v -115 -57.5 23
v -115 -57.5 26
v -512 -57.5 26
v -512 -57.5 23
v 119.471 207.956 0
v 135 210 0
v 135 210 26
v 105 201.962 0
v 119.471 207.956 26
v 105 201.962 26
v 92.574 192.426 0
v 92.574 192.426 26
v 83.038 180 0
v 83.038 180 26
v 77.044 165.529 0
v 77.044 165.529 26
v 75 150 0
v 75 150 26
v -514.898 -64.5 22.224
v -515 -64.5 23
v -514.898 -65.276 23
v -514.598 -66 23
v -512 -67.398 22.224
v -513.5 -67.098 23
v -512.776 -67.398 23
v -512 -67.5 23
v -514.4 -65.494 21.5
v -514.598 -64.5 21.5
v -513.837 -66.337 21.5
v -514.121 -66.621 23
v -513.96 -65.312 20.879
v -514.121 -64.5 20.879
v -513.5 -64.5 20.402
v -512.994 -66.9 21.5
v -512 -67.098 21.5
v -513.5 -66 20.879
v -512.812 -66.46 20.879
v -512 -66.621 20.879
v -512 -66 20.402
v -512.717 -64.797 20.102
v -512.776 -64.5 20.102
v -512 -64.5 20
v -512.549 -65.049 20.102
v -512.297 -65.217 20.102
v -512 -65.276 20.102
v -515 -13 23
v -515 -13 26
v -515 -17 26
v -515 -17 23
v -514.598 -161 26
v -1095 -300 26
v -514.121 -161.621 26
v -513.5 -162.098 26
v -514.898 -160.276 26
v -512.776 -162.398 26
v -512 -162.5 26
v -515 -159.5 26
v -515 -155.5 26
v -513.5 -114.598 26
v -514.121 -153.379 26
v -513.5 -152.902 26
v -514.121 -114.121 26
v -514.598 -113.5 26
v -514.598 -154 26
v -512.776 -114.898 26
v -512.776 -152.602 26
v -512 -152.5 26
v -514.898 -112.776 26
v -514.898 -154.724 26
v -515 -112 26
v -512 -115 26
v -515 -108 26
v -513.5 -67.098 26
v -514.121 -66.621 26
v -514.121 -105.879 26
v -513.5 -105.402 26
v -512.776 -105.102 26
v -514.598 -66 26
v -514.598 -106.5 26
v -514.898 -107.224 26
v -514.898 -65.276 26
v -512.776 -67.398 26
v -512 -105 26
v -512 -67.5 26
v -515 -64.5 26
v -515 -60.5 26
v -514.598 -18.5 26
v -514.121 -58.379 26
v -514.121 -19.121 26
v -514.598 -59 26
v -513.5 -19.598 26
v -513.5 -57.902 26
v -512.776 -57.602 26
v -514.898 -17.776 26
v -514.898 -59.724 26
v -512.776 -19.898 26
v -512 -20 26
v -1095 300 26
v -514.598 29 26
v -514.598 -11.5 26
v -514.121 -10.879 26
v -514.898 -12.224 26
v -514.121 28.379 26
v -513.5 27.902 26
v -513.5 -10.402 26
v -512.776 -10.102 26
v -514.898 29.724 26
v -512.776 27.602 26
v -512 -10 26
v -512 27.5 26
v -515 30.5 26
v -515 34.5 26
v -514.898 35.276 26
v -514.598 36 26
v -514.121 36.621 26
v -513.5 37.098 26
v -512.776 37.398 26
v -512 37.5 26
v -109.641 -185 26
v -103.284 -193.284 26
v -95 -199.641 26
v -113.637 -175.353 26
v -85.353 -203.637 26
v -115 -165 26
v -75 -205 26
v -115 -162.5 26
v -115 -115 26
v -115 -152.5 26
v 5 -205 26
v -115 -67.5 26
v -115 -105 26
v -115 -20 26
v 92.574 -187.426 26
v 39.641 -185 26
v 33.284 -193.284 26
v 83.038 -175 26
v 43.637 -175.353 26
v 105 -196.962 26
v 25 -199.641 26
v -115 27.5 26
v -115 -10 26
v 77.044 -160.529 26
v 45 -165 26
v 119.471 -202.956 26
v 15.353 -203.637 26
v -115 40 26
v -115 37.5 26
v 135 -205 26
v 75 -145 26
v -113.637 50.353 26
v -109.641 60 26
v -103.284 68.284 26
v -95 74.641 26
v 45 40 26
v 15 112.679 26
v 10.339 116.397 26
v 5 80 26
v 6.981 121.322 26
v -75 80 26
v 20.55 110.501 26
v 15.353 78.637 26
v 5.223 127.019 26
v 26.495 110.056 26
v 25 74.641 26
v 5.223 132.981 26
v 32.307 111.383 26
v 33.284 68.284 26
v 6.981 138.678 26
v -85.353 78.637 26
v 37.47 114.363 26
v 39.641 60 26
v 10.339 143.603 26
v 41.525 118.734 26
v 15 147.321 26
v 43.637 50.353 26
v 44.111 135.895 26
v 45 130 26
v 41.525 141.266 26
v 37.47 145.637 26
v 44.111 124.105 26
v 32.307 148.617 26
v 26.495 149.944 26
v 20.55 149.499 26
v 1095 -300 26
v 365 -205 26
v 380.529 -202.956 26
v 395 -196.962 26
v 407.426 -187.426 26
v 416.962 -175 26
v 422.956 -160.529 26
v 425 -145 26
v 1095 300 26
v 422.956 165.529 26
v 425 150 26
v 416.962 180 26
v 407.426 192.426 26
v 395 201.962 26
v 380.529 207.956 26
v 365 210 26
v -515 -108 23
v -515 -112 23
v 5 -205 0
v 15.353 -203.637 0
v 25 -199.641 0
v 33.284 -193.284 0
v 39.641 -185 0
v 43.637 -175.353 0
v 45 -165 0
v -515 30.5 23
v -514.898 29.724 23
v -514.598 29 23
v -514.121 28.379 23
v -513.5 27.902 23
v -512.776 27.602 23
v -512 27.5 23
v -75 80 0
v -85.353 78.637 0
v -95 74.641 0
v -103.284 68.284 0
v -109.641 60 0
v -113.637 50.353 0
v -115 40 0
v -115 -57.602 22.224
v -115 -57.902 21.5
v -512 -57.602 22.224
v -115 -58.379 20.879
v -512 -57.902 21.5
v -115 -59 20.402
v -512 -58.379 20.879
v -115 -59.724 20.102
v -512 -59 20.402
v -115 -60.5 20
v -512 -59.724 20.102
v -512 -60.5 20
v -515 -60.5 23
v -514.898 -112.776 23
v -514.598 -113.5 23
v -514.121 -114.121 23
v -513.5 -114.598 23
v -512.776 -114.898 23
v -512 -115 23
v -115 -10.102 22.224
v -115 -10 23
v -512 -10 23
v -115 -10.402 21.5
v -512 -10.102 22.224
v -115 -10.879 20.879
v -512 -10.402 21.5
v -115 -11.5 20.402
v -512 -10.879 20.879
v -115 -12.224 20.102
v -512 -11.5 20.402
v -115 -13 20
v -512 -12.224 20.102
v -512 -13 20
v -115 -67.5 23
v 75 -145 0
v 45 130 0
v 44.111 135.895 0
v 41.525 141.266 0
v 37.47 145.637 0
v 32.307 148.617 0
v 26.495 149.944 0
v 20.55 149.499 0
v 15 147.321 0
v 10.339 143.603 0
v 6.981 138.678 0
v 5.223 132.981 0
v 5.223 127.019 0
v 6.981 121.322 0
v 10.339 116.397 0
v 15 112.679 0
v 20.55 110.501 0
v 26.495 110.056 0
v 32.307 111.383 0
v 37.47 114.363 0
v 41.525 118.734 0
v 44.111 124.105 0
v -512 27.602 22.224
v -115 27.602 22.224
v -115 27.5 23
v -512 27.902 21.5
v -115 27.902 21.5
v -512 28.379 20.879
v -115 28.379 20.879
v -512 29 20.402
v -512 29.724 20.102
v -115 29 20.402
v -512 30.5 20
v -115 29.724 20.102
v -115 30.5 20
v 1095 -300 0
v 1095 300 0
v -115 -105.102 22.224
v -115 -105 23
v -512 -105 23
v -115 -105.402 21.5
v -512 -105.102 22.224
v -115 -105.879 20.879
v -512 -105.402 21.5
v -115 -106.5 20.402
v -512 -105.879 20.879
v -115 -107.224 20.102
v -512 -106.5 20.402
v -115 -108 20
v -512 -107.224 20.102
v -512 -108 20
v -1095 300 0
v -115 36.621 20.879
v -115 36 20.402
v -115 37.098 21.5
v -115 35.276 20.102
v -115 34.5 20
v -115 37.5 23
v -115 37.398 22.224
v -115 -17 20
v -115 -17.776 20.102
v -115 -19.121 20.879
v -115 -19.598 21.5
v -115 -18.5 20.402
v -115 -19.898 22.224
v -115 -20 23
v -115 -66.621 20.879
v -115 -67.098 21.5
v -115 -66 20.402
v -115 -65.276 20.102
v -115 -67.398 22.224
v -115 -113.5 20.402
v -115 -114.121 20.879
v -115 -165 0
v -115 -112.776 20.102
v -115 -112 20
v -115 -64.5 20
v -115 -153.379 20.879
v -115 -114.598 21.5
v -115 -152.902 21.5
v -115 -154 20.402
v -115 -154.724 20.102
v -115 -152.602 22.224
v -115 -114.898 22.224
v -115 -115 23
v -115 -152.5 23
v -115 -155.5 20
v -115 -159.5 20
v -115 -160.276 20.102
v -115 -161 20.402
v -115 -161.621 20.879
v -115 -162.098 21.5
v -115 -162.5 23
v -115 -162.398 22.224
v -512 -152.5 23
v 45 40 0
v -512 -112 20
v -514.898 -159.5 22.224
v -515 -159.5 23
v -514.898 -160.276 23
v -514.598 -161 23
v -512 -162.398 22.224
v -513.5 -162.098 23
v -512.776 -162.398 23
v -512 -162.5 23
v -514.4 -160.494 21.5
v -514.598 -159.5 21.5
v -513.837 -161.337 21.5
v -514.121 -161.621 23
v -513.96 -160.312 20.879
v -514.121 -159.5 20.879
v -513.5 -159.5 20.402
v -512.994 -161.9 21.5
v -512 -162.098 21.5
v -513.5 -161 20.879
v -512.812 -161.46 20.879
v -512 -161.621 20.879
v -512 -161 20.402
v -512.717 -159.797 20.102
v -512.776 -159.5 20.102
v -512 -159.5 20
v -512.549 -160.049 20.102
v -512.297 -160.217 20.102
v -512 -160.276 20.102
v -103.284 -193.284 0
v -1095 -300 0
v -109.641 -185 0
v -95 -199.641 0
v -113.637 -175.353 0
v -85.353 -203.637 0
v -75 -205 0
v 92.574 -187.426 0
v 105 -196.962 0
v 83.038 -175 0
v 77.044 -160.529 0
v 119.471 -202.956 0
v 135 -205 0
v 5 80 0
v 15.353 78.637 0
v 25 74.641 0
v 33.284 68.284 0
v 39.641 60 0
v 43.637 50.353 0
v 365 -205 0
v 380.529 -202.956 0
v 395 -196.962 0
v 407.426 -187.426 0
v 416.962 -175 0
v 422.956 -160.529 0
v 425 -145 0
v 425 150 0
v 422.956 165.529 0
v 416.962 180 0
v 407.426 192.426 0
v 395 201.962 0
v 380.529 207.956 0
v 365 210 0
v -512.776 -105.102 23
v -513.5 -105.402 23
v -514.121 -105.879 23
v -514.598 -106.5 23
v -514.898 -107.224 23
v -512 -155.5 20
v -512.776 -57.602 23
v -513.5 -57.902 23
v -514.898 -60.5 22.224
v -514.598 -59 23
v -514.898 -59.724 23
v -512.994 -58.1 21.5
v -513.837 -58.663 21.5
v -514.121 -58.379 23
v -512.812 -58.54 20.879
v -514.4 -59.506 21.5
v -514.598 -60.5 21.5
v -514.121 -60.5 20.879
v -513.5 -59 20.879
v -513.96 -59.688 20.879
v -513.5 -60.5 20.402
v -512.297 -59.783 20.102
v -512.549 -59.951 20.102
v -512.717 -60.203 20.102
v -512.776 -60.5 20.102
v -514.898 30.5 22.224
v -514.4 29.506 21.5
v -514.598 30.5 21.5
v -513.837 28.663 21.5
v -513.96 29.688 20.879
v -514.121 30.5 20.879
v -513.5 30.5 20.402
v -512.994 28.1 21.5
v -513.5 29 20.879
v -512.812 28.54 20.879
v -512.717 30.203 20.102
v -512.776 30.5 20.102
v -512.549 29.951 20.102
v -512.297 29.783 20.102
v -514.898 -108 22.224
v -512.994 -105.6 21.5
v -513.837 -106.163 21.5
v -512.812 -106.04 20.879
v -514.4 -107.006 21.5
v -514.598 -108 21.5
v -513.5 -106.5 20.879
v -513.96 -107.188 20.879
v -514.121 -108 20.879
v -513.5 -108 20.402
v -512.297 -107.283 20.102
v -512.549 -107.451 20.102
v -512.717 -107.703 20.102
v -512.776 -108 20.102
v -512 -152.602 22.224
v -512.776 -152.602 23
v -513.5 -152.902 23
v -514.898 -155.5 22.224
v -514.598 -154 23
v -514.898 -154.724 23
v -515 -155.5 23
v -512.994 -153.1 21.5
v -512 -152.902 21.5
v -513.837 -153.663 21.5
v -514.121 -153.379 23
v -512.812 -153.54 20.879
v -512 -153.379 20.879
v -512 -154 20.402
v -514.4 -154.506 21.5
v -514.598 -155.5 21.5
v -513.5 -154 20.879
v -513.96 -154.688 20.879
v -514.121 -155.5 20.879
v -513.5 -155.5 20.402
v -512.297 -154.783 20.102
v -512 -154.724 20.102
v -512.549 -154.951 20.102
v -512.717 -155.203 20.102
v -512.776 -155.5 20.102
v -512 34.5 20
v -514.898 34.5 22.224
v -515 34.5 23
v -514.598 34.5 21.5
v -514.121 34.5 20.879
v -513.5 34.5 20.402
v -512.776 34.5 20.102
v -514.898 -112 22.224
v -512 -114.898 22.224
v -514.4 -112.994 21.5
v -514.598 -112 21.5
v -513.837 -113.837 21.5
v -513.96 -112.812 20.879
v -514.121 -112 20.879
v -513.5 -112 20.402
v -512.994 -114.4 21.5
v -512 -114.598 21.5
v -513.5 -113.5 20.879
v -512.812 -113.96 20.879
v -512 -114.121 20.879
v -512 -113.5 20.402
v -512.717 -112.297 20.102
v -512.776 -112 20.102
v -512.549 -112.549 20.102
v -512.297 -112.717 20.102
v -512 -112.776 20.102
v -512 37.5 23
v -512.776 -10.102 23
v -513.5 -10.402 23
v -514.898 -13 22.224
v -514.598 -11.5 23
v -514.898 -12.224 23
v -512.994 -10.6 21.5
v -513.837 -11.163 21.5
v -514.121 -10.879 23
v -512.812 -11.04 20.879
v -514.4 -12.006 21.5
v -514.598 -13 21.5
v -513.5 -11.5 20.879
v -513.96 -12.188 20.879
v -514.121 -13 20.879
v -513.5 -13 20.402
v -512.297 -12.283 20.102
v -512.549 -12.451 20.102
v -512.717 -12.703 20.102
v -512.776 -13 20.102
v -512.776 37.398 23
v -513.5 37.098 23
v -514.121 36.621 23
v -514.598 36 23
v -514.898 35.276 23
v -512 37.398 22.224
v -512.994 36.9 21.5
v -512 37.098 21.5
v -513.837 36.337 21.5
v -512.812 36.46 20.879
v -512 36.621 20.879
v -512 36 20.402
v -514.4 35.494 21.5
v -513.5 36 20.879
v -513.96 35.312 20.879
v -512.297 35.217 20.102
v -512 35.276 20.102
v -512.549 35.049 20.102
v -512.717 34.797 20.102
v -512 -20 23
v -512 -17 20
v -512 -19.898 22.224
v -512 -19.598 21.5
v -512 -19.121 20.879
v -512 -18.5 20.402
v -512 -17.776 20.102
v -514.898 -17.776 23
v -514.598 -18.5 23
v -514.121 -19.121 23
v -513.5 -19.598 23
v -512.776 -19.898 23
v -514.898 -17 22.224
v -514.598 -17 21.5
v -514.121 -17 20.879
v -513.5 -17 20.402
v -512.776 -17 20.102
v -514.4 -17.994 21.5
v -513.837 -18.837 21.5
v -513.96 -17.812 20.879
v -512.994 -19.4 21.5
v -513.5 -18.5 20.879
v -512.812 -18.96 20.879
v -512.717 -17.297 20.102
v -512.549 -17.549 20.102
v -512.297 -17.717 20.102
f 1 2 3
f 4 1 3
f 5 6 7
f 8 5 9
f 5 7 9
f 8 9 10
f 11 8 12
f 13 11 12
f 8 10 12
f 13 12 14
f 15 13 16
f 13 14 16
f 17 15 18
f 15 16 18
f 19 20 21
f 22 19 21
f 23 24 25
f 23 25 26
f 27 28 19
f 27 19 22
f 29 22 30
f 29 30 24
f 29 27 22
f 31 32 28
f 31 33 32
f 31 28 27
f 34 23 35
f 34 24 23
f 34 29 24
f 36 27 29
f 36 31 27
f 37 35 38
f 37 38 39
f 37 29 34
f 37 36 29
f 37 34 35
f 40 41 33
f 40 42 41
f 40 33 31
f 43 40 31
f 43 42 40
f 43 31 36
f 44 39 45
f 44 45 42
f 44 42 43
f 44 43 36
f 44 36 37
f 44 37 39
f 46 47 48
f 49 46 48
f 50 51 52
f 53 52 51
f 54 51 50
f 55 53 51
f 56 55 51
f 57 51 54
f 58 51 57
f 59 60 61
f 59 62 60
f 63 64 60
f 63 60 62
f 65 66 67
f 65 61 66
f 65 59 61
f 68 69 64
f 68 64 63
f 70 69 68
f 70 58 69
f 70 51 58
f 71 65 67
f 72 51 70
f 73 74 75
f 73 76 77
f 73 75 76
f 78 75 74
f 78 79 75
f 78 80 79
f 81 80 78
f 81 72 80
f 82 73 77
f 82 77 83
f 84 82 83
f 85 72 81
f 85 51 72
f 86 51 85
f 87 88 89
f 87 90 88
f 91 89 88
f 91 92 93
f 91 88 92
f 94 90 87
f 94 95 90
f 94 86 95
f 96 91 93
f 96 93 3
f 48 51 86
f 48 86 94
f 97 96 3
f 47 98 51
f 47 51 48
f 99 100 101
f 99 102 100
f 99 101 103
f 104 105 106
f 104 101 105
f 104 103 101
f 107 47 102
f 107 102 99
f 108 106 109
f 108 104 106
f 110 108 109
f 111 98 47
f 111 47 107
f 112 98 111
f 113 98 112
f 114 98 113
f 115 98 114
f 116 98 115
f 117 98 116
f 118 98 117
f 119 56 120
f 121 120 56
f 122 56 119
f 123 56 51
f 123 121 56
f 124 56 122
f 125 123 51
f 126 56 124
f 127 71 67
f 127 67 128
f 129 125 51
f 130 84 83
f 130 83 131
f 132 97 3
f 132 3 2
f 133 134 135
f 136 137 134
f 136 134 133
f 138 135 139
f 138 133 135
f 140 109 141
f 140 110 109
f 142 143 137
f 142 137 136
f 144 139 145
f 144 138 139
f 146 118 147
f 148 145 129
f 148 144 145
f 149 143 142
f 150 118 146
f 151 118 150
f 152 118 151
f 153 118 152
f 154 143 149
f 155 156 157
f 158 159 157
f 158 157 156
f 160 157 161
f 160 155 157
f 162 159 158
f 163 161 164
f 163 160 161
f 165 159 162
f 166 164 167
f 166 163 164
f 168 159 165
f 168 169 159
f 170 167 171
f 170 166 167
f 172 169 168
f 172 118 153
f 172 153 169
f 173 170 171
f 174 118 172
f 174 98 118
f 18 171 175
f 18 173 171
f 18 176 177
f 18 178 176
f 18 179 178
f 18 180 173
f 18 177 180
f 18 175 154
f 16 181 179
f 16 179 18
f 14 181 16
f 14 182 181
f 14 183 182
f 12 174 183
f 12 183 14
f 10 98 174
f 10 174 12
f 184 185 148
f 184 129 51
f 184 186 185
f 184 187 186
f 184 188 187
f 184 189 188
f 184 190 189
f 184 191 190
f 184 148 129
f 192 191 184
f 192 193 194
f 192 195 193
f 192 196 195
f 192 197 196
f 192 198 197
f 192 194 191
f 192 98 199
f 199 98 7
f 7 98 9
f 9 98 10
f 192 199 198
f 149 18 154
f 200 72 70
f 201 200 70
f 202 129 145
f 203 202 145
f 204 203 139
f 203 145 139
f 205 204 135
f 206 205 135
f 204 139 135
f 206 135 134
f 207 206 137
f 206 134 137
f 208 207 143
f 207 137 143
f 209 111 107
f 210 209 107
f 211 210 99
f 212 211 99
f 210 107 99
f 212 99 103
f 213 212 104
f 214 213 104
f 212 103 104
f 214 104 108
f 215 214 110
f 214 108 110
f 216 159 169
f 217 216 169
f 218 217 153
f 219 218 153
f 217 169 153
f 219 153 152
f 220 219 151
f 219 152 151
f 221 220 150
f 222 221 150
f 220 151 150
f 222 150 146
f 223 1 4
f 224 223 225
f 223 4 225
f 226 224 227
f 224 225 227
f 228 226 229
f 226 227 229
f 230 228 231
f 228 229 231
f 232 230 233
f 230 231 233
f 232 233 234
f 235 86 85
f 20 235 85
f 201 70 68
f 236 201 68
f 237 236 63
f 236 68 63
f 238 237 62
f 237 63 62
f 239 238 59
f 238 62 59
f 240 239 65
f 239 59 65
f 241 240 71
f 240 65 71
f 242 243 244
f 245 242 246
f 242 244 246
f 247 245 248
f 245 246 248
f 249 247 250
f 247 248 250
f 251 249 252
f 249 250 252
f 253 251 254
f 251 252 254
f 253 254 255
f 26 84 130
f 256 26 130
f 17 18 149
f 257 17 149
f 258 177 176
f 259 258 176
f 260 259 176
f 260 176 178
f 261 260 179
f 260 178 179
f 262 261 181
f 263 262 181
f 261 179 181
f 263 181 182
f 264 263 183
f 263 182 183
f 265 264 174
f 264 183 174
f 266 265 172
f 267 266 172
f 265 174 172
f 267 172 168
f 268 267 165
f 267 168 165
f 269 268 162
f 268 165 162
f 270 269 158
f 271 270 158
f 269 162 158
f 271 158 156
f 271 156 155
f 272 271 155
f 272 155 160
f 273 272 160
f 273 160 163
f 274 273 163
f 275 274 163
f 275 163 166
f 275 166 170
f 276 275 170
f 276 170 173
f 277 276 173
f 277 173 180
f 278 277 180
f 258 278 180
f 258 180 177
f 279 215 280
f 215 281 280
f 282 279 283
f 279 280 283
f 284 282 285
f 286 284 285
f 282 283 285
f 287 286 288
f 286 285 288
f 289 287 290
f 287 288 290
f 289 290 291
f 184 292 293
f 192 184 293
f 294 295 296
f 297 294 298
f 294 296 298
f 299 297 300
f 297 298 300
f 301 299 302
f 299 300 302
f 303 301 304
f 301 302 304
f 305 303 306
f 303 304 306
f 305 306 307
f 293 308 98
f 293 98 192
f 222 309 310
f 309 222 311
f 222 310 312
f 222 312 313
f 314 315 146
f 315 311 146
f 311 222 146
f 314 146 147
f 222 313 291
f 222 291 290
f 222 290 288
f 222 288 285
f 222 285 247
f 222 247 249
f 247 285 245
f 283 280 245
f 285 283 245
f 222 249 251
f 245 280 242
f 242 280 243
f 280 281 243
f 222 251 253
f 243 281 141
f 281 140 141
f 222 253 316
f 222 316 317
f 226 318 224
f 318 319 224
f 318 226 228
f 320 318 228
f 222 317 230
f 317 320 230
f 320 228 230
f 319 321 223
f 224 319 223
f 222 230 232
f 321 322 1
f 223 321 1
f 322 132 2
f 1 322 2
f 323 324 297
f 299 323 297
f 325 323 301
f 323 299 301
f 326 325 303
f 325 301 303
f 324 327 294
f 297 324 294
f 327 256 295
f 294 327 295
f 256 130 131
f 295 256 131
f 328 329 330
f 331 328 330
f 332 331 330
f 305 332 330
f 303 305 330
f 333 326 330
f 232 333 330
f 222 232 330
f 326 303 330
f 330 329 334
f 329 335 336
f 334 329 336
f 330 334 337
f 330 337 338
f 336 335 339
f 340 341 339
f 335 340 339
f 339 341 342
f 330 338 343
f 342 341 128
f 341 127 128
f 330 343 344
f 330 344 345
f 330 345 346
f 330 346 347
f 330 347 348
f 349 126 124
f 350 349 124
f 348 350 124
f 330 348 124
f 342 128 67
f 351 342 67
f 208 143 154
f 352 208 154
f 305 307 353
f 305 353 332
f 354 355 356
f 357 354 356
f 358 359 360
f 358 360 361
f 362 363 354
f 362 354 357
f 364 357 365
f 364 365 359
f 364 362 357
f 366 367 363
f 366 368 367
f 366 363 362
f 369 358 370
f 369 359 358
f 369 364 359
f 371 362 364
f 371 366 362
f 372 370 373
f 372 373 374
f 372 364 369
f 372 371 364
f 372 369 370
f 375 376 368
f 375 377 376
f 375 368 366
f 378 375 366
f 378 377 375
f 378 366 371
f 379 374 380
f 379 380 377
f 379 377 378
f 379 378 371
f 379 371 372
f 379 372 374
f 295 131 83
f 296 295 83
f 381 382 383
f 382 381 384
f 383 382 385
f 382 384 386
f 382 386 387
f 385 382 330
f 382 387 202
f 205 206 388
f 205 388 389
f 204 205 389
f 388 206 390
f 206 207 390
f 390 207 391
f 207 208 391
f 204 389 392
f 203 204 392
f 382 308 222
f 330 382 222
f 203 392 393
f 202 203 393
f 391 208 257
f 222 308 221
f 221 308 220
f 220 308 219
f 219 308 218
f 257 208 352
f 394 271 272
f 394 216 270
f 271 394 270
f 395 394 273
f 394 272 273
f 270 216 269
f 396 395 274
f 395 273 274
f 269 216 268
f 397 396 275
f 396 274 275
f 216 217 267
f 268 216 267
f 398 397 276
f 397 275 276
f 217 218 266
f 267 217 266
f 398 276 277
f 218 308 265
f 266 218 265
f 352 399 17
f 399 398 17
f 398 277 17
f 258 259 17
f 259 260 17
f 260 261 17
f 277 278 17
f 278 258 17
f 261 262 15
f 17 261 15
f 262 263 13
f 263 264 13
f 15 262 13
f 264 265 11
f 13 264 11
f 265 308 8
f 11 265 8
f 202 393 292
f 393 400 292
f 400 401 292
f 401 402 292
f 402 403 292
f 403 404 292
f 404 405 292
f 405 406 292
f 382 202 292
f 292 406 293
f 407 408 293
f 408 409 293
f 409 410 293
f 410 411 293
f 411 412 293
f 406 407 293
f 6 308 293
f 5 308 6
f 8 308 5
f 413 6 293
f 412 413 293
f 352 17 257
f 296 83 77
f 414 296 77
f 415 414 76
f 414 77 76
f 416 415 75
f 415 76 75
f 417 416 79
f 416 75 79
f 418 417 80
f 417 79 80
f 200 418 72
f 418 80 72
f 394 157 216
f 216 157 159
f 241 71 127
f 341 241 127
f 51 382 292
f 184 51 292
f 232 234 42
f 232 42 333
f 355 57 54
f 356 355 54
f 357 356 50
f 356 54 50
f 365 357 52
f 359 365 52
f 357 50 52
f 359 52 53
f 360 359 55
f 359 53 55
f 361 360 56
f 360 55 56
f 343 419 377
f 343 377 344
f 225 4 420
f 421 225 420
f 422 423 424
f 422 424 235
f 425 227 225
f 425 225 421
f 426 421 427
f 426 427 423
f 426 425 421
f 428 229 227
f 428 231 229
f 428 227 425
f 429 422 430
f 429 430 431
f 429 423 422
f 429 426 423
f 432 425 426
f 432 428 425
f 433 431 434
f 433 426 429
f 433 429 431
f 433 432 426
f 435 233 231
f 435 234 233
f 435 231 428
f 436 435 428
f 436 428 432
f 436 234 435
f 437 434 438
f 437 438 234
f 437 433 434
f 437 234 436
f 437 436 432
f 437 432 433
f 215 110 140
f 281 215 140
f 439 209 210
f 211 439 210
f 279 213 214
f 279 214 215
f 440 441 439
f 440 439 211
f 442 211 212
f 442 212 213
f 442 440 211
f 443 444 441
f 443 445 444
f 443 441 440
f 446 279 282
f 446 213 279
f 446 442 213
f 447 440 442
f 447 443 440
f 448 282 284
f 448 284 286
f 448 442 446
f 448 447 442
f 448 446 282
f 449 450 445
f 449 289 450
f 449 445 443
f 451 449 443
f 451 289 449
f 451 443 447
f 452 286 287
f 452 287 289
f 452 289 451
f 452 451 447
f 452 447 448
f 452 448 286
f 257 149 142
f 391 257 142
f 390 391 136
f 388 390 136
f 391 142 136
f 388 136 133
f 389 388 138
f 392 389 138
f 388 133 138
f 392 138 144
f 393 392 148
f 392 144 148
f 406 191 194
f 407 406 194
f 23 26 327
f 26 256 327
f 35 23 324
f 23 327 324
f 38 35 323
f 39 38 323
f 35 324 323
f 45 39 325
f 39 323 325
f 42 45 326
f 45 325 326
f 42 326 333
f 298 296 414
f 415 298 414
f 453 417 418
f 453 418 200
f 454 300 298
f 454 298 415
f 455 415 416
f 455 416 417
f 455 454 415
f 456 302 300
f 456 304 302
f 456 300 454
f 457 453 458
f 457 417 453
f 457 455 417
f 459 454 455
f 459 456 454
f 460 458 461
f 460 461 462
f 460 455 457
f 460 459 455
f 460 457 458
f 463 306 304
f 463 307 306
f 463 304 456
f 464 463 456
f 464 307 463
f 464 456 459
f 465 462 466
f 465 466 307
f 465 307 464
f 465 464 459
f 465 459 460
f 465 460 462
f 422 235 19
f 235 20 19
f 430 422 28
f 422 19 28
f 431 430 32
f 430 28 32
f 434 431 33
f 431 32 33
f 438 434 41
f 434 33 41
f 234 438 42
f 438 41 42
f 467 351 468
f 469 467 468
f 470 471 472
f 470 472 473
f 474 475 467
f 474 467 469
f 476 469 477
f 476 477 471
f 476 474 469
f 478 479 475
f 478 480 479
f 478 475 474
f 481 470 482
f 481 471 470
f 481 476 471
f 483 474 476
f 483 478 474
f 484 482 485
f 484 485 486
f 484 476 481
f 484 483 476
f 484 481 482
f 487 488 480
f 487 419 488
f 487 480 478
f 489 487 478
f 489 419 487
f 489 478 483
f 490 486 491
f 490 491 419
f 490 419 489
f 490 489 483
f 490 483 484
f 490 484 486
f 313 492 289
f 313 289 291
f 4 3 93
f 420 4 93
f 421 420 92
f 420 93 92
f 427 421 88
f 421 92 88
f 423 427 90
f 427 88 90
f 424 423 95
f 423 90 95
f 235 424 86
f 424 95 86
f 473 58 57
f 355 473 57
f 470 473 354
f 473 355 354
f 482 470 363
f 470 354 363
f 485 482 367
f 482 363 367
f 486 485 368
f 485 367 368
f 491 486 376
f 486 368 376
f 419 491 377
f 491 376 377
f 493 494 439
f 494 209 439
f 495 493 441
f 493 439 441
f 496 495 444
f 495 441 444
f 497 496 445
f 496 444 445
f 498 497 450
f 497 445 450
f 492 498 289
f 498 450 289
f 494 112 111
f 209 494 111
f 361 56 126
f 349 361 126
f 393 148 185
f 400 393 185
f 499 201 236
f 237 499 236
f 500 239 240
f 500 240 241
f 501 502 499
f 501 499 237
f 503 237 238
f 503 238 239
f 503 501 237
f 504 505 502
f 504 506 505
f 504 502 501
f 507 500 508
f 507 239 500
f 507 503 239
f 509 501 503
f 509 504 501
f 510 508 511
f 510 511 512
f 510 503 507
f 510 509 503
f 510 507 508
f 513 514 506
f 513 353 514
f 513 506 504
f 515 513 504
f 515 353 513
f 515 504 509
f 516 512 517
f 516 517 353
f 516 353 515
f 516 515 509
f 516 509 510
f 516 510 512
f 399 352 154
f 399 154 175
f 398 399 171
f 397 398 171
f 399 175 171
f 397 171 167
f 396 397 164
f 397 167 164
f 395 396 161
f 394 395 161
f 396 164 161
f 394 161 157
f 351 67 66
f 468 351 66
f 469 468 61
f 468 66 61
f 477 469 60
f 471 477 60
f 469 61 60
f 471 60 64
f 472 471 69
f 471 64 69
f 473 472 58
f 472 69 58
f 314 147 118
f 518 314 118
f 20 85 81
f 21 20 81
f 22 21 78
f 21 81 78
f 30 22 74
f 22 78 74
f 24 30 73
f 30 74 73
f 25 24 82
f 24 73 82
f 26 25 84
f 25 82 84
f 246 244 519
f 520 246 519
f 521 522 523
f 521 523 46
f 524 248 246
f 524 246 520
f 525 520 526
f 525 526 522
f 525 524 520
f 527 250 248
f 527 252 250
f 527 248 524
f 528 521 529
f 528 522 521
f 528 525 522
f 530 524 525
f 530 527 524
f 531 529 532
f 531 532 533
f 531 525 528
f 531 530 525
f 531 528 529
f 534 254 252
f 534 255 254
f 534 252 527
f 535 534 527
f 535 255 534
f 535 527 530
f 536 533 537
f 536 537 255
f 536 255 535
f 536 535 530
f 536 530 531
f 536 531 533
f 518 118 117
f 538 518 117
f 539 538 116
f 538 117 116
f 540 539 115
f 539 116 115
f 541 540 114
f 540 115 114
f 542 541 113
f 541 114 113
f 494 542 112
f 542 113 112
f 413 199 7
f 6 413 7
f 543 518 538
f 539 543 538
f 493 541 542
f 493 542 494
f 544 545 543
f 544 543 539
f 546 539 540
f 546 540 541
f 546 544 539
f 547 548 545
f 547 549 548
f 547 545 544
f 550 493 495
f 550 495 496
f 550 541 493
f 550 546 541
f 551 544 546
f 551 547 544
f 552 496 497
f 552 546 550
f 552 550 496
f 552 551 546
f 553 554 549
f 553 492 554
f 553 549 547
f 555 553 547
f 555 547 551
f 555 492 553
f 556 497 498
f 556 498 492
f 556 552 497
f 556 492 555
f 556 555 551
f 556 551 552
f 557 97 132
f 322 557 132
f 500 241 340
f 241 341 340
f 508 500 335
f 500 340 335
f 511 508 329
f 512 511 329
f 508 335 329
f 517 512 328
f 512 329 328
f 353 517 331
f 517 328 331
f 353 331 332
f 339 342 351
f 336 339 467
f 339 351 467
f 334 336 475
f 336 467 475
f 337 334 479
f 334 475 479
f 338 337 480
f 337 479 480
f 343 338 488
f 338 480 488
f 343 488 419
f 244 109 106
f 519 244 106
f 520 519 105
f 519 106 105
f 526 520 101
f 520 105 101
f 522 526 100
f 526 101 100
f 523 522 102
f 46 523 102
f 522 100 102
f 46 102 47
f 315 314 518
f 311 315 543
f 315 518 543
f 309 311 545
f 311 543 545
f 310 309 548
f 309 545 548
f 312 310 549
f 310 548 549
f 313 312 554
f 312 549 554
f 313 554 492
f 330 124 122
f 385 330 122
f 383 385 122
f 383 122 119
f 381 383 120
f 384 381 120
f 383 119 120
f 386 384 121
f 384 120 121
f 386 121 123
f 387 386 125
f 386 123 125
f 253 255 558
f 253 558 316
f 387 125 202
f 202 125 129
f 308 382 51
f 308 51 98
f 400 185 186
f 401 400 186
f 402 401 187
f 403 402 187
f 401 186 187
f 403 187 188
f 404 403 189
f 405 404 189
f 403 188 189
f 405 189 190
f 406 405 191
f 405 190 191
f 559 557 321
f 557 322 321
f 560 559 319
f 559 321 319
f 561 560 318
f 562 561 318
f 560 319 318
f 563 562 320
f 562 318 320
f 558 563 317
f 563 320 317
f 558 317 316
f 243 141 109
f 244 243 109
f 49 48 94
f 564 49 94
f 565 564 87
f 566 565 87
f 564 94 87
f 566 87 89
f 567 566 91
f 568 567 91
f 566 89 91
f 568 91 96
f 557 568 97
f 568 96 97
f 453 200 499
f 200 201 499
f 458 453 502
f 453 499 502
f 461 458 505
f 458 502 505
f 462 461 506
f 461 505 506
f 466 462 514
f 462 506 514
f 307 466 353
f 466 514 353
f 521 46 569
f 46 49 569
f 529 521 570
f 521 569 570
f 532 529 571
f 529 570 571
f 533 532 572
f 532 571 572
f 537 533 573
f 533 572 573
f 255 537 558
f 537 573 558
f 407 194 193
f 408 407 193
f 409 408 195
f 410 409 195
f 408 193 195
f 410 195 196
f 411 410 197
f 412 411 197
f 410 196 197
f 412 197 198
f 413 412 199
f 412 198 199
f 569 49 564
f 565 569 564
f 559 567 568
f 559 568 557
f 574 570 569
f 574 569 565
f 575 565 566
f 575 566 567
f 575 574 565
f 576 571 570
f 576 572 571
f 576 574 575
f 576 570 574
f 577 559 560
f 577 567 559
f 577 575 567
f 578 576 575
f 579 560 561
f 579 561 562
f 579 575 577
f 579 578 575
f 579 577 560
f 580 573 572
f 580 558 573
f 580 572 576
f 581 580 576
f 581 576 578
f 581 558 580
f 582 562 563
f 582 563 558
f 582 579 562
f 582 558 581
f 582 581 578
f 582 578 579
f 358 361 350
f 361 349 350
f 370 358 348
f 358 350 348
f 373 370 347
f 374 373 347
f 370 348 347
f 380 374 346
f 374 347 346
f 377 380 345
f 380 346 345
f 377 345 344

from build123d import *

# Parameters (mm, degrees)
F0_W     = 2190
F0_H     = 600
F1_DEPTH = 26
F3_DEPTH = 26.001
F5_DEPTH = 6
F6_R     = 3
F7_R     = 20
F8_DEPTH = 26.001


with BuildPart() as f1:
    # F0 (on Top) → F1 (new body)
    with BuildSketch(Plane.XY):
        Rectangle(F0_W, F0_H)
    extrude(amount=F1_DEPTH)

    # F2 (on face) → F3 (cut, through all)
    with BuildSketch(Plane.XY.offset(26)):
        with BuildLine():
            Line((135, -205), (365, -205))
            ThreePointArc((365, -205), (407.426407, -187.426407), (425, -145))
            Line((425, -145), (425, 150))
            ThreePointArc((425, 150), (407.426407, 192.426407), (365, 210))
            Line((365, 210), (135, 210))
            ThreePointArc((135, 210), (92.573593, 192.426407), (75, 150))
            Line((75, 150), (75, -145))
            ThreePointArc((75, -145), (92.573593, -187.426407), (135, -205))
        make_face()
        with BuildLine():
            Line((-75, -205), (5, -205))
            ThreePointArc((5, -205), (33.284271, -193.284271), (45, -165))
            Line((45, -165), (45, 40))
            ThreePointArc((45, 40), (33.284271, 68.284271), (5, 80))
            Line((5, 80), (-75, 80))
            ThreePointArc((-75, 80), (-103.284271, 68.284271), (-115, 40))
            Line((-115, 40), (-115, -165))
            ThreePointArc((-115, -165), (-103.284271, -193.284271), (-75, -205))
        make_face()
    extrude(amount=-F3_DEPTH, mode=Mode.SUBTRACT)

    # F4 (on face) → F5 (cut)
    with BuildSketch(Plane.XY.offset(26)):
        with BuildLine():
            Line((-115, -162.5), (-115, -152.5))
            Line((-115, -152.5), (-512, -152.5))
            ThreePointArc((-512, -152.5), (-514.12132, -153.37868), (-515, -155.5))
            Line((-515, -155.5), (-515, -159.5))
            ThreePointArc((-515, -159.5), (-514.12132, -161.62132), (-512, -162.5))
            Line((-512, -162.5), (-115, -162.5))
        make_face()
        with BuildLine():
            Line((-115, -115), (-115, -105))
            Line((-115, -105), (-512, -105))
            ThreePointArc((-512, -105), (-514.12132, -105.87868), (-515, -108))
            Line((-515, -108), (-515, -112))
            ThreePointArc((-515, -112), (-514.12132, -114.12132), (-512, -115))
            Line((-512, -115), (-115, -115))
        make_face()
        with BuildLine():
            Line((-115, -67.5), (-115, -57.5))
            Line((-115, -57.5), (-512, -57.5))
            ThreePointArc((-512, -57.5), (-514.12132, -58.37868), (-515, -60.5))
            Line((-515, -60.5), (-515, -64.5))
            ThreePointArc((-515, -64.5), (-514.12132, -66.62132), (-512, -67.5))
            Line((-512, -67.5), (-115, -67.5))
        make_face()
        with BuildLine():
            Line((-115, -20), (-115, -10))
            Line((-115, -10), (-512, -10))
            ThreePointArc((-512, -10), (-514.12132, -10.87868), (-515, -13))
            Line((-515, -13), (-515, -17))
            ThreePointArc((-515, -17), (-514.12132, -19.12132), (-512, -20))
            Line((-512, -20), (-115, -20))
        make_face()
        with BuildLine():
            Line((-115, 27.5), (-115, 37.5))
            Line((-115, 37.5), (-512, 37.5))
            ThreePointArc((-512, 37.5), (-514.12132, 36.62132), (-515, 34.5))
            Line((-515, 34.5), (-515, 30.5))
            ThreePointArc((-515, 30.5), (-514.12132, 28.37868), (-512, 27.5))
            Line((-512, 27.5), (-115, 27.5))
        make_face()
    extrude(amount=-F5_DEPTH, mode=Mode.SUBTRACT)

    # F6
    f6_edges = [f1.edges().sort_by_distance(p)[0] for p in [
        (-313.5, 37.5, 20),
        (-313.5, -10, 20),
        (-313.5, -57.5, 20),
        (-313.5, -105, 20),
        (-313.5, -152.5, 20),
        (-313.5, -162.5, 20),
        (-313.5, -115, 20),
        (-313.5, -20, 20),
        (-313.5, -67.5, 20),
        (-313.5, 27.5, 20),
    ]]
    fillet(f6_edges, radius=F6_R)

    # F7 (on face) → F8 (cut, through all)
    with BuildSketch(Plane.XY.offset(26)):
        with Locations((25, 130)):
            Circle(F7_R)
    extrude(amount=-F8_DEPTH, mode=Mode.SUBTRACT)


solid = f1.part
